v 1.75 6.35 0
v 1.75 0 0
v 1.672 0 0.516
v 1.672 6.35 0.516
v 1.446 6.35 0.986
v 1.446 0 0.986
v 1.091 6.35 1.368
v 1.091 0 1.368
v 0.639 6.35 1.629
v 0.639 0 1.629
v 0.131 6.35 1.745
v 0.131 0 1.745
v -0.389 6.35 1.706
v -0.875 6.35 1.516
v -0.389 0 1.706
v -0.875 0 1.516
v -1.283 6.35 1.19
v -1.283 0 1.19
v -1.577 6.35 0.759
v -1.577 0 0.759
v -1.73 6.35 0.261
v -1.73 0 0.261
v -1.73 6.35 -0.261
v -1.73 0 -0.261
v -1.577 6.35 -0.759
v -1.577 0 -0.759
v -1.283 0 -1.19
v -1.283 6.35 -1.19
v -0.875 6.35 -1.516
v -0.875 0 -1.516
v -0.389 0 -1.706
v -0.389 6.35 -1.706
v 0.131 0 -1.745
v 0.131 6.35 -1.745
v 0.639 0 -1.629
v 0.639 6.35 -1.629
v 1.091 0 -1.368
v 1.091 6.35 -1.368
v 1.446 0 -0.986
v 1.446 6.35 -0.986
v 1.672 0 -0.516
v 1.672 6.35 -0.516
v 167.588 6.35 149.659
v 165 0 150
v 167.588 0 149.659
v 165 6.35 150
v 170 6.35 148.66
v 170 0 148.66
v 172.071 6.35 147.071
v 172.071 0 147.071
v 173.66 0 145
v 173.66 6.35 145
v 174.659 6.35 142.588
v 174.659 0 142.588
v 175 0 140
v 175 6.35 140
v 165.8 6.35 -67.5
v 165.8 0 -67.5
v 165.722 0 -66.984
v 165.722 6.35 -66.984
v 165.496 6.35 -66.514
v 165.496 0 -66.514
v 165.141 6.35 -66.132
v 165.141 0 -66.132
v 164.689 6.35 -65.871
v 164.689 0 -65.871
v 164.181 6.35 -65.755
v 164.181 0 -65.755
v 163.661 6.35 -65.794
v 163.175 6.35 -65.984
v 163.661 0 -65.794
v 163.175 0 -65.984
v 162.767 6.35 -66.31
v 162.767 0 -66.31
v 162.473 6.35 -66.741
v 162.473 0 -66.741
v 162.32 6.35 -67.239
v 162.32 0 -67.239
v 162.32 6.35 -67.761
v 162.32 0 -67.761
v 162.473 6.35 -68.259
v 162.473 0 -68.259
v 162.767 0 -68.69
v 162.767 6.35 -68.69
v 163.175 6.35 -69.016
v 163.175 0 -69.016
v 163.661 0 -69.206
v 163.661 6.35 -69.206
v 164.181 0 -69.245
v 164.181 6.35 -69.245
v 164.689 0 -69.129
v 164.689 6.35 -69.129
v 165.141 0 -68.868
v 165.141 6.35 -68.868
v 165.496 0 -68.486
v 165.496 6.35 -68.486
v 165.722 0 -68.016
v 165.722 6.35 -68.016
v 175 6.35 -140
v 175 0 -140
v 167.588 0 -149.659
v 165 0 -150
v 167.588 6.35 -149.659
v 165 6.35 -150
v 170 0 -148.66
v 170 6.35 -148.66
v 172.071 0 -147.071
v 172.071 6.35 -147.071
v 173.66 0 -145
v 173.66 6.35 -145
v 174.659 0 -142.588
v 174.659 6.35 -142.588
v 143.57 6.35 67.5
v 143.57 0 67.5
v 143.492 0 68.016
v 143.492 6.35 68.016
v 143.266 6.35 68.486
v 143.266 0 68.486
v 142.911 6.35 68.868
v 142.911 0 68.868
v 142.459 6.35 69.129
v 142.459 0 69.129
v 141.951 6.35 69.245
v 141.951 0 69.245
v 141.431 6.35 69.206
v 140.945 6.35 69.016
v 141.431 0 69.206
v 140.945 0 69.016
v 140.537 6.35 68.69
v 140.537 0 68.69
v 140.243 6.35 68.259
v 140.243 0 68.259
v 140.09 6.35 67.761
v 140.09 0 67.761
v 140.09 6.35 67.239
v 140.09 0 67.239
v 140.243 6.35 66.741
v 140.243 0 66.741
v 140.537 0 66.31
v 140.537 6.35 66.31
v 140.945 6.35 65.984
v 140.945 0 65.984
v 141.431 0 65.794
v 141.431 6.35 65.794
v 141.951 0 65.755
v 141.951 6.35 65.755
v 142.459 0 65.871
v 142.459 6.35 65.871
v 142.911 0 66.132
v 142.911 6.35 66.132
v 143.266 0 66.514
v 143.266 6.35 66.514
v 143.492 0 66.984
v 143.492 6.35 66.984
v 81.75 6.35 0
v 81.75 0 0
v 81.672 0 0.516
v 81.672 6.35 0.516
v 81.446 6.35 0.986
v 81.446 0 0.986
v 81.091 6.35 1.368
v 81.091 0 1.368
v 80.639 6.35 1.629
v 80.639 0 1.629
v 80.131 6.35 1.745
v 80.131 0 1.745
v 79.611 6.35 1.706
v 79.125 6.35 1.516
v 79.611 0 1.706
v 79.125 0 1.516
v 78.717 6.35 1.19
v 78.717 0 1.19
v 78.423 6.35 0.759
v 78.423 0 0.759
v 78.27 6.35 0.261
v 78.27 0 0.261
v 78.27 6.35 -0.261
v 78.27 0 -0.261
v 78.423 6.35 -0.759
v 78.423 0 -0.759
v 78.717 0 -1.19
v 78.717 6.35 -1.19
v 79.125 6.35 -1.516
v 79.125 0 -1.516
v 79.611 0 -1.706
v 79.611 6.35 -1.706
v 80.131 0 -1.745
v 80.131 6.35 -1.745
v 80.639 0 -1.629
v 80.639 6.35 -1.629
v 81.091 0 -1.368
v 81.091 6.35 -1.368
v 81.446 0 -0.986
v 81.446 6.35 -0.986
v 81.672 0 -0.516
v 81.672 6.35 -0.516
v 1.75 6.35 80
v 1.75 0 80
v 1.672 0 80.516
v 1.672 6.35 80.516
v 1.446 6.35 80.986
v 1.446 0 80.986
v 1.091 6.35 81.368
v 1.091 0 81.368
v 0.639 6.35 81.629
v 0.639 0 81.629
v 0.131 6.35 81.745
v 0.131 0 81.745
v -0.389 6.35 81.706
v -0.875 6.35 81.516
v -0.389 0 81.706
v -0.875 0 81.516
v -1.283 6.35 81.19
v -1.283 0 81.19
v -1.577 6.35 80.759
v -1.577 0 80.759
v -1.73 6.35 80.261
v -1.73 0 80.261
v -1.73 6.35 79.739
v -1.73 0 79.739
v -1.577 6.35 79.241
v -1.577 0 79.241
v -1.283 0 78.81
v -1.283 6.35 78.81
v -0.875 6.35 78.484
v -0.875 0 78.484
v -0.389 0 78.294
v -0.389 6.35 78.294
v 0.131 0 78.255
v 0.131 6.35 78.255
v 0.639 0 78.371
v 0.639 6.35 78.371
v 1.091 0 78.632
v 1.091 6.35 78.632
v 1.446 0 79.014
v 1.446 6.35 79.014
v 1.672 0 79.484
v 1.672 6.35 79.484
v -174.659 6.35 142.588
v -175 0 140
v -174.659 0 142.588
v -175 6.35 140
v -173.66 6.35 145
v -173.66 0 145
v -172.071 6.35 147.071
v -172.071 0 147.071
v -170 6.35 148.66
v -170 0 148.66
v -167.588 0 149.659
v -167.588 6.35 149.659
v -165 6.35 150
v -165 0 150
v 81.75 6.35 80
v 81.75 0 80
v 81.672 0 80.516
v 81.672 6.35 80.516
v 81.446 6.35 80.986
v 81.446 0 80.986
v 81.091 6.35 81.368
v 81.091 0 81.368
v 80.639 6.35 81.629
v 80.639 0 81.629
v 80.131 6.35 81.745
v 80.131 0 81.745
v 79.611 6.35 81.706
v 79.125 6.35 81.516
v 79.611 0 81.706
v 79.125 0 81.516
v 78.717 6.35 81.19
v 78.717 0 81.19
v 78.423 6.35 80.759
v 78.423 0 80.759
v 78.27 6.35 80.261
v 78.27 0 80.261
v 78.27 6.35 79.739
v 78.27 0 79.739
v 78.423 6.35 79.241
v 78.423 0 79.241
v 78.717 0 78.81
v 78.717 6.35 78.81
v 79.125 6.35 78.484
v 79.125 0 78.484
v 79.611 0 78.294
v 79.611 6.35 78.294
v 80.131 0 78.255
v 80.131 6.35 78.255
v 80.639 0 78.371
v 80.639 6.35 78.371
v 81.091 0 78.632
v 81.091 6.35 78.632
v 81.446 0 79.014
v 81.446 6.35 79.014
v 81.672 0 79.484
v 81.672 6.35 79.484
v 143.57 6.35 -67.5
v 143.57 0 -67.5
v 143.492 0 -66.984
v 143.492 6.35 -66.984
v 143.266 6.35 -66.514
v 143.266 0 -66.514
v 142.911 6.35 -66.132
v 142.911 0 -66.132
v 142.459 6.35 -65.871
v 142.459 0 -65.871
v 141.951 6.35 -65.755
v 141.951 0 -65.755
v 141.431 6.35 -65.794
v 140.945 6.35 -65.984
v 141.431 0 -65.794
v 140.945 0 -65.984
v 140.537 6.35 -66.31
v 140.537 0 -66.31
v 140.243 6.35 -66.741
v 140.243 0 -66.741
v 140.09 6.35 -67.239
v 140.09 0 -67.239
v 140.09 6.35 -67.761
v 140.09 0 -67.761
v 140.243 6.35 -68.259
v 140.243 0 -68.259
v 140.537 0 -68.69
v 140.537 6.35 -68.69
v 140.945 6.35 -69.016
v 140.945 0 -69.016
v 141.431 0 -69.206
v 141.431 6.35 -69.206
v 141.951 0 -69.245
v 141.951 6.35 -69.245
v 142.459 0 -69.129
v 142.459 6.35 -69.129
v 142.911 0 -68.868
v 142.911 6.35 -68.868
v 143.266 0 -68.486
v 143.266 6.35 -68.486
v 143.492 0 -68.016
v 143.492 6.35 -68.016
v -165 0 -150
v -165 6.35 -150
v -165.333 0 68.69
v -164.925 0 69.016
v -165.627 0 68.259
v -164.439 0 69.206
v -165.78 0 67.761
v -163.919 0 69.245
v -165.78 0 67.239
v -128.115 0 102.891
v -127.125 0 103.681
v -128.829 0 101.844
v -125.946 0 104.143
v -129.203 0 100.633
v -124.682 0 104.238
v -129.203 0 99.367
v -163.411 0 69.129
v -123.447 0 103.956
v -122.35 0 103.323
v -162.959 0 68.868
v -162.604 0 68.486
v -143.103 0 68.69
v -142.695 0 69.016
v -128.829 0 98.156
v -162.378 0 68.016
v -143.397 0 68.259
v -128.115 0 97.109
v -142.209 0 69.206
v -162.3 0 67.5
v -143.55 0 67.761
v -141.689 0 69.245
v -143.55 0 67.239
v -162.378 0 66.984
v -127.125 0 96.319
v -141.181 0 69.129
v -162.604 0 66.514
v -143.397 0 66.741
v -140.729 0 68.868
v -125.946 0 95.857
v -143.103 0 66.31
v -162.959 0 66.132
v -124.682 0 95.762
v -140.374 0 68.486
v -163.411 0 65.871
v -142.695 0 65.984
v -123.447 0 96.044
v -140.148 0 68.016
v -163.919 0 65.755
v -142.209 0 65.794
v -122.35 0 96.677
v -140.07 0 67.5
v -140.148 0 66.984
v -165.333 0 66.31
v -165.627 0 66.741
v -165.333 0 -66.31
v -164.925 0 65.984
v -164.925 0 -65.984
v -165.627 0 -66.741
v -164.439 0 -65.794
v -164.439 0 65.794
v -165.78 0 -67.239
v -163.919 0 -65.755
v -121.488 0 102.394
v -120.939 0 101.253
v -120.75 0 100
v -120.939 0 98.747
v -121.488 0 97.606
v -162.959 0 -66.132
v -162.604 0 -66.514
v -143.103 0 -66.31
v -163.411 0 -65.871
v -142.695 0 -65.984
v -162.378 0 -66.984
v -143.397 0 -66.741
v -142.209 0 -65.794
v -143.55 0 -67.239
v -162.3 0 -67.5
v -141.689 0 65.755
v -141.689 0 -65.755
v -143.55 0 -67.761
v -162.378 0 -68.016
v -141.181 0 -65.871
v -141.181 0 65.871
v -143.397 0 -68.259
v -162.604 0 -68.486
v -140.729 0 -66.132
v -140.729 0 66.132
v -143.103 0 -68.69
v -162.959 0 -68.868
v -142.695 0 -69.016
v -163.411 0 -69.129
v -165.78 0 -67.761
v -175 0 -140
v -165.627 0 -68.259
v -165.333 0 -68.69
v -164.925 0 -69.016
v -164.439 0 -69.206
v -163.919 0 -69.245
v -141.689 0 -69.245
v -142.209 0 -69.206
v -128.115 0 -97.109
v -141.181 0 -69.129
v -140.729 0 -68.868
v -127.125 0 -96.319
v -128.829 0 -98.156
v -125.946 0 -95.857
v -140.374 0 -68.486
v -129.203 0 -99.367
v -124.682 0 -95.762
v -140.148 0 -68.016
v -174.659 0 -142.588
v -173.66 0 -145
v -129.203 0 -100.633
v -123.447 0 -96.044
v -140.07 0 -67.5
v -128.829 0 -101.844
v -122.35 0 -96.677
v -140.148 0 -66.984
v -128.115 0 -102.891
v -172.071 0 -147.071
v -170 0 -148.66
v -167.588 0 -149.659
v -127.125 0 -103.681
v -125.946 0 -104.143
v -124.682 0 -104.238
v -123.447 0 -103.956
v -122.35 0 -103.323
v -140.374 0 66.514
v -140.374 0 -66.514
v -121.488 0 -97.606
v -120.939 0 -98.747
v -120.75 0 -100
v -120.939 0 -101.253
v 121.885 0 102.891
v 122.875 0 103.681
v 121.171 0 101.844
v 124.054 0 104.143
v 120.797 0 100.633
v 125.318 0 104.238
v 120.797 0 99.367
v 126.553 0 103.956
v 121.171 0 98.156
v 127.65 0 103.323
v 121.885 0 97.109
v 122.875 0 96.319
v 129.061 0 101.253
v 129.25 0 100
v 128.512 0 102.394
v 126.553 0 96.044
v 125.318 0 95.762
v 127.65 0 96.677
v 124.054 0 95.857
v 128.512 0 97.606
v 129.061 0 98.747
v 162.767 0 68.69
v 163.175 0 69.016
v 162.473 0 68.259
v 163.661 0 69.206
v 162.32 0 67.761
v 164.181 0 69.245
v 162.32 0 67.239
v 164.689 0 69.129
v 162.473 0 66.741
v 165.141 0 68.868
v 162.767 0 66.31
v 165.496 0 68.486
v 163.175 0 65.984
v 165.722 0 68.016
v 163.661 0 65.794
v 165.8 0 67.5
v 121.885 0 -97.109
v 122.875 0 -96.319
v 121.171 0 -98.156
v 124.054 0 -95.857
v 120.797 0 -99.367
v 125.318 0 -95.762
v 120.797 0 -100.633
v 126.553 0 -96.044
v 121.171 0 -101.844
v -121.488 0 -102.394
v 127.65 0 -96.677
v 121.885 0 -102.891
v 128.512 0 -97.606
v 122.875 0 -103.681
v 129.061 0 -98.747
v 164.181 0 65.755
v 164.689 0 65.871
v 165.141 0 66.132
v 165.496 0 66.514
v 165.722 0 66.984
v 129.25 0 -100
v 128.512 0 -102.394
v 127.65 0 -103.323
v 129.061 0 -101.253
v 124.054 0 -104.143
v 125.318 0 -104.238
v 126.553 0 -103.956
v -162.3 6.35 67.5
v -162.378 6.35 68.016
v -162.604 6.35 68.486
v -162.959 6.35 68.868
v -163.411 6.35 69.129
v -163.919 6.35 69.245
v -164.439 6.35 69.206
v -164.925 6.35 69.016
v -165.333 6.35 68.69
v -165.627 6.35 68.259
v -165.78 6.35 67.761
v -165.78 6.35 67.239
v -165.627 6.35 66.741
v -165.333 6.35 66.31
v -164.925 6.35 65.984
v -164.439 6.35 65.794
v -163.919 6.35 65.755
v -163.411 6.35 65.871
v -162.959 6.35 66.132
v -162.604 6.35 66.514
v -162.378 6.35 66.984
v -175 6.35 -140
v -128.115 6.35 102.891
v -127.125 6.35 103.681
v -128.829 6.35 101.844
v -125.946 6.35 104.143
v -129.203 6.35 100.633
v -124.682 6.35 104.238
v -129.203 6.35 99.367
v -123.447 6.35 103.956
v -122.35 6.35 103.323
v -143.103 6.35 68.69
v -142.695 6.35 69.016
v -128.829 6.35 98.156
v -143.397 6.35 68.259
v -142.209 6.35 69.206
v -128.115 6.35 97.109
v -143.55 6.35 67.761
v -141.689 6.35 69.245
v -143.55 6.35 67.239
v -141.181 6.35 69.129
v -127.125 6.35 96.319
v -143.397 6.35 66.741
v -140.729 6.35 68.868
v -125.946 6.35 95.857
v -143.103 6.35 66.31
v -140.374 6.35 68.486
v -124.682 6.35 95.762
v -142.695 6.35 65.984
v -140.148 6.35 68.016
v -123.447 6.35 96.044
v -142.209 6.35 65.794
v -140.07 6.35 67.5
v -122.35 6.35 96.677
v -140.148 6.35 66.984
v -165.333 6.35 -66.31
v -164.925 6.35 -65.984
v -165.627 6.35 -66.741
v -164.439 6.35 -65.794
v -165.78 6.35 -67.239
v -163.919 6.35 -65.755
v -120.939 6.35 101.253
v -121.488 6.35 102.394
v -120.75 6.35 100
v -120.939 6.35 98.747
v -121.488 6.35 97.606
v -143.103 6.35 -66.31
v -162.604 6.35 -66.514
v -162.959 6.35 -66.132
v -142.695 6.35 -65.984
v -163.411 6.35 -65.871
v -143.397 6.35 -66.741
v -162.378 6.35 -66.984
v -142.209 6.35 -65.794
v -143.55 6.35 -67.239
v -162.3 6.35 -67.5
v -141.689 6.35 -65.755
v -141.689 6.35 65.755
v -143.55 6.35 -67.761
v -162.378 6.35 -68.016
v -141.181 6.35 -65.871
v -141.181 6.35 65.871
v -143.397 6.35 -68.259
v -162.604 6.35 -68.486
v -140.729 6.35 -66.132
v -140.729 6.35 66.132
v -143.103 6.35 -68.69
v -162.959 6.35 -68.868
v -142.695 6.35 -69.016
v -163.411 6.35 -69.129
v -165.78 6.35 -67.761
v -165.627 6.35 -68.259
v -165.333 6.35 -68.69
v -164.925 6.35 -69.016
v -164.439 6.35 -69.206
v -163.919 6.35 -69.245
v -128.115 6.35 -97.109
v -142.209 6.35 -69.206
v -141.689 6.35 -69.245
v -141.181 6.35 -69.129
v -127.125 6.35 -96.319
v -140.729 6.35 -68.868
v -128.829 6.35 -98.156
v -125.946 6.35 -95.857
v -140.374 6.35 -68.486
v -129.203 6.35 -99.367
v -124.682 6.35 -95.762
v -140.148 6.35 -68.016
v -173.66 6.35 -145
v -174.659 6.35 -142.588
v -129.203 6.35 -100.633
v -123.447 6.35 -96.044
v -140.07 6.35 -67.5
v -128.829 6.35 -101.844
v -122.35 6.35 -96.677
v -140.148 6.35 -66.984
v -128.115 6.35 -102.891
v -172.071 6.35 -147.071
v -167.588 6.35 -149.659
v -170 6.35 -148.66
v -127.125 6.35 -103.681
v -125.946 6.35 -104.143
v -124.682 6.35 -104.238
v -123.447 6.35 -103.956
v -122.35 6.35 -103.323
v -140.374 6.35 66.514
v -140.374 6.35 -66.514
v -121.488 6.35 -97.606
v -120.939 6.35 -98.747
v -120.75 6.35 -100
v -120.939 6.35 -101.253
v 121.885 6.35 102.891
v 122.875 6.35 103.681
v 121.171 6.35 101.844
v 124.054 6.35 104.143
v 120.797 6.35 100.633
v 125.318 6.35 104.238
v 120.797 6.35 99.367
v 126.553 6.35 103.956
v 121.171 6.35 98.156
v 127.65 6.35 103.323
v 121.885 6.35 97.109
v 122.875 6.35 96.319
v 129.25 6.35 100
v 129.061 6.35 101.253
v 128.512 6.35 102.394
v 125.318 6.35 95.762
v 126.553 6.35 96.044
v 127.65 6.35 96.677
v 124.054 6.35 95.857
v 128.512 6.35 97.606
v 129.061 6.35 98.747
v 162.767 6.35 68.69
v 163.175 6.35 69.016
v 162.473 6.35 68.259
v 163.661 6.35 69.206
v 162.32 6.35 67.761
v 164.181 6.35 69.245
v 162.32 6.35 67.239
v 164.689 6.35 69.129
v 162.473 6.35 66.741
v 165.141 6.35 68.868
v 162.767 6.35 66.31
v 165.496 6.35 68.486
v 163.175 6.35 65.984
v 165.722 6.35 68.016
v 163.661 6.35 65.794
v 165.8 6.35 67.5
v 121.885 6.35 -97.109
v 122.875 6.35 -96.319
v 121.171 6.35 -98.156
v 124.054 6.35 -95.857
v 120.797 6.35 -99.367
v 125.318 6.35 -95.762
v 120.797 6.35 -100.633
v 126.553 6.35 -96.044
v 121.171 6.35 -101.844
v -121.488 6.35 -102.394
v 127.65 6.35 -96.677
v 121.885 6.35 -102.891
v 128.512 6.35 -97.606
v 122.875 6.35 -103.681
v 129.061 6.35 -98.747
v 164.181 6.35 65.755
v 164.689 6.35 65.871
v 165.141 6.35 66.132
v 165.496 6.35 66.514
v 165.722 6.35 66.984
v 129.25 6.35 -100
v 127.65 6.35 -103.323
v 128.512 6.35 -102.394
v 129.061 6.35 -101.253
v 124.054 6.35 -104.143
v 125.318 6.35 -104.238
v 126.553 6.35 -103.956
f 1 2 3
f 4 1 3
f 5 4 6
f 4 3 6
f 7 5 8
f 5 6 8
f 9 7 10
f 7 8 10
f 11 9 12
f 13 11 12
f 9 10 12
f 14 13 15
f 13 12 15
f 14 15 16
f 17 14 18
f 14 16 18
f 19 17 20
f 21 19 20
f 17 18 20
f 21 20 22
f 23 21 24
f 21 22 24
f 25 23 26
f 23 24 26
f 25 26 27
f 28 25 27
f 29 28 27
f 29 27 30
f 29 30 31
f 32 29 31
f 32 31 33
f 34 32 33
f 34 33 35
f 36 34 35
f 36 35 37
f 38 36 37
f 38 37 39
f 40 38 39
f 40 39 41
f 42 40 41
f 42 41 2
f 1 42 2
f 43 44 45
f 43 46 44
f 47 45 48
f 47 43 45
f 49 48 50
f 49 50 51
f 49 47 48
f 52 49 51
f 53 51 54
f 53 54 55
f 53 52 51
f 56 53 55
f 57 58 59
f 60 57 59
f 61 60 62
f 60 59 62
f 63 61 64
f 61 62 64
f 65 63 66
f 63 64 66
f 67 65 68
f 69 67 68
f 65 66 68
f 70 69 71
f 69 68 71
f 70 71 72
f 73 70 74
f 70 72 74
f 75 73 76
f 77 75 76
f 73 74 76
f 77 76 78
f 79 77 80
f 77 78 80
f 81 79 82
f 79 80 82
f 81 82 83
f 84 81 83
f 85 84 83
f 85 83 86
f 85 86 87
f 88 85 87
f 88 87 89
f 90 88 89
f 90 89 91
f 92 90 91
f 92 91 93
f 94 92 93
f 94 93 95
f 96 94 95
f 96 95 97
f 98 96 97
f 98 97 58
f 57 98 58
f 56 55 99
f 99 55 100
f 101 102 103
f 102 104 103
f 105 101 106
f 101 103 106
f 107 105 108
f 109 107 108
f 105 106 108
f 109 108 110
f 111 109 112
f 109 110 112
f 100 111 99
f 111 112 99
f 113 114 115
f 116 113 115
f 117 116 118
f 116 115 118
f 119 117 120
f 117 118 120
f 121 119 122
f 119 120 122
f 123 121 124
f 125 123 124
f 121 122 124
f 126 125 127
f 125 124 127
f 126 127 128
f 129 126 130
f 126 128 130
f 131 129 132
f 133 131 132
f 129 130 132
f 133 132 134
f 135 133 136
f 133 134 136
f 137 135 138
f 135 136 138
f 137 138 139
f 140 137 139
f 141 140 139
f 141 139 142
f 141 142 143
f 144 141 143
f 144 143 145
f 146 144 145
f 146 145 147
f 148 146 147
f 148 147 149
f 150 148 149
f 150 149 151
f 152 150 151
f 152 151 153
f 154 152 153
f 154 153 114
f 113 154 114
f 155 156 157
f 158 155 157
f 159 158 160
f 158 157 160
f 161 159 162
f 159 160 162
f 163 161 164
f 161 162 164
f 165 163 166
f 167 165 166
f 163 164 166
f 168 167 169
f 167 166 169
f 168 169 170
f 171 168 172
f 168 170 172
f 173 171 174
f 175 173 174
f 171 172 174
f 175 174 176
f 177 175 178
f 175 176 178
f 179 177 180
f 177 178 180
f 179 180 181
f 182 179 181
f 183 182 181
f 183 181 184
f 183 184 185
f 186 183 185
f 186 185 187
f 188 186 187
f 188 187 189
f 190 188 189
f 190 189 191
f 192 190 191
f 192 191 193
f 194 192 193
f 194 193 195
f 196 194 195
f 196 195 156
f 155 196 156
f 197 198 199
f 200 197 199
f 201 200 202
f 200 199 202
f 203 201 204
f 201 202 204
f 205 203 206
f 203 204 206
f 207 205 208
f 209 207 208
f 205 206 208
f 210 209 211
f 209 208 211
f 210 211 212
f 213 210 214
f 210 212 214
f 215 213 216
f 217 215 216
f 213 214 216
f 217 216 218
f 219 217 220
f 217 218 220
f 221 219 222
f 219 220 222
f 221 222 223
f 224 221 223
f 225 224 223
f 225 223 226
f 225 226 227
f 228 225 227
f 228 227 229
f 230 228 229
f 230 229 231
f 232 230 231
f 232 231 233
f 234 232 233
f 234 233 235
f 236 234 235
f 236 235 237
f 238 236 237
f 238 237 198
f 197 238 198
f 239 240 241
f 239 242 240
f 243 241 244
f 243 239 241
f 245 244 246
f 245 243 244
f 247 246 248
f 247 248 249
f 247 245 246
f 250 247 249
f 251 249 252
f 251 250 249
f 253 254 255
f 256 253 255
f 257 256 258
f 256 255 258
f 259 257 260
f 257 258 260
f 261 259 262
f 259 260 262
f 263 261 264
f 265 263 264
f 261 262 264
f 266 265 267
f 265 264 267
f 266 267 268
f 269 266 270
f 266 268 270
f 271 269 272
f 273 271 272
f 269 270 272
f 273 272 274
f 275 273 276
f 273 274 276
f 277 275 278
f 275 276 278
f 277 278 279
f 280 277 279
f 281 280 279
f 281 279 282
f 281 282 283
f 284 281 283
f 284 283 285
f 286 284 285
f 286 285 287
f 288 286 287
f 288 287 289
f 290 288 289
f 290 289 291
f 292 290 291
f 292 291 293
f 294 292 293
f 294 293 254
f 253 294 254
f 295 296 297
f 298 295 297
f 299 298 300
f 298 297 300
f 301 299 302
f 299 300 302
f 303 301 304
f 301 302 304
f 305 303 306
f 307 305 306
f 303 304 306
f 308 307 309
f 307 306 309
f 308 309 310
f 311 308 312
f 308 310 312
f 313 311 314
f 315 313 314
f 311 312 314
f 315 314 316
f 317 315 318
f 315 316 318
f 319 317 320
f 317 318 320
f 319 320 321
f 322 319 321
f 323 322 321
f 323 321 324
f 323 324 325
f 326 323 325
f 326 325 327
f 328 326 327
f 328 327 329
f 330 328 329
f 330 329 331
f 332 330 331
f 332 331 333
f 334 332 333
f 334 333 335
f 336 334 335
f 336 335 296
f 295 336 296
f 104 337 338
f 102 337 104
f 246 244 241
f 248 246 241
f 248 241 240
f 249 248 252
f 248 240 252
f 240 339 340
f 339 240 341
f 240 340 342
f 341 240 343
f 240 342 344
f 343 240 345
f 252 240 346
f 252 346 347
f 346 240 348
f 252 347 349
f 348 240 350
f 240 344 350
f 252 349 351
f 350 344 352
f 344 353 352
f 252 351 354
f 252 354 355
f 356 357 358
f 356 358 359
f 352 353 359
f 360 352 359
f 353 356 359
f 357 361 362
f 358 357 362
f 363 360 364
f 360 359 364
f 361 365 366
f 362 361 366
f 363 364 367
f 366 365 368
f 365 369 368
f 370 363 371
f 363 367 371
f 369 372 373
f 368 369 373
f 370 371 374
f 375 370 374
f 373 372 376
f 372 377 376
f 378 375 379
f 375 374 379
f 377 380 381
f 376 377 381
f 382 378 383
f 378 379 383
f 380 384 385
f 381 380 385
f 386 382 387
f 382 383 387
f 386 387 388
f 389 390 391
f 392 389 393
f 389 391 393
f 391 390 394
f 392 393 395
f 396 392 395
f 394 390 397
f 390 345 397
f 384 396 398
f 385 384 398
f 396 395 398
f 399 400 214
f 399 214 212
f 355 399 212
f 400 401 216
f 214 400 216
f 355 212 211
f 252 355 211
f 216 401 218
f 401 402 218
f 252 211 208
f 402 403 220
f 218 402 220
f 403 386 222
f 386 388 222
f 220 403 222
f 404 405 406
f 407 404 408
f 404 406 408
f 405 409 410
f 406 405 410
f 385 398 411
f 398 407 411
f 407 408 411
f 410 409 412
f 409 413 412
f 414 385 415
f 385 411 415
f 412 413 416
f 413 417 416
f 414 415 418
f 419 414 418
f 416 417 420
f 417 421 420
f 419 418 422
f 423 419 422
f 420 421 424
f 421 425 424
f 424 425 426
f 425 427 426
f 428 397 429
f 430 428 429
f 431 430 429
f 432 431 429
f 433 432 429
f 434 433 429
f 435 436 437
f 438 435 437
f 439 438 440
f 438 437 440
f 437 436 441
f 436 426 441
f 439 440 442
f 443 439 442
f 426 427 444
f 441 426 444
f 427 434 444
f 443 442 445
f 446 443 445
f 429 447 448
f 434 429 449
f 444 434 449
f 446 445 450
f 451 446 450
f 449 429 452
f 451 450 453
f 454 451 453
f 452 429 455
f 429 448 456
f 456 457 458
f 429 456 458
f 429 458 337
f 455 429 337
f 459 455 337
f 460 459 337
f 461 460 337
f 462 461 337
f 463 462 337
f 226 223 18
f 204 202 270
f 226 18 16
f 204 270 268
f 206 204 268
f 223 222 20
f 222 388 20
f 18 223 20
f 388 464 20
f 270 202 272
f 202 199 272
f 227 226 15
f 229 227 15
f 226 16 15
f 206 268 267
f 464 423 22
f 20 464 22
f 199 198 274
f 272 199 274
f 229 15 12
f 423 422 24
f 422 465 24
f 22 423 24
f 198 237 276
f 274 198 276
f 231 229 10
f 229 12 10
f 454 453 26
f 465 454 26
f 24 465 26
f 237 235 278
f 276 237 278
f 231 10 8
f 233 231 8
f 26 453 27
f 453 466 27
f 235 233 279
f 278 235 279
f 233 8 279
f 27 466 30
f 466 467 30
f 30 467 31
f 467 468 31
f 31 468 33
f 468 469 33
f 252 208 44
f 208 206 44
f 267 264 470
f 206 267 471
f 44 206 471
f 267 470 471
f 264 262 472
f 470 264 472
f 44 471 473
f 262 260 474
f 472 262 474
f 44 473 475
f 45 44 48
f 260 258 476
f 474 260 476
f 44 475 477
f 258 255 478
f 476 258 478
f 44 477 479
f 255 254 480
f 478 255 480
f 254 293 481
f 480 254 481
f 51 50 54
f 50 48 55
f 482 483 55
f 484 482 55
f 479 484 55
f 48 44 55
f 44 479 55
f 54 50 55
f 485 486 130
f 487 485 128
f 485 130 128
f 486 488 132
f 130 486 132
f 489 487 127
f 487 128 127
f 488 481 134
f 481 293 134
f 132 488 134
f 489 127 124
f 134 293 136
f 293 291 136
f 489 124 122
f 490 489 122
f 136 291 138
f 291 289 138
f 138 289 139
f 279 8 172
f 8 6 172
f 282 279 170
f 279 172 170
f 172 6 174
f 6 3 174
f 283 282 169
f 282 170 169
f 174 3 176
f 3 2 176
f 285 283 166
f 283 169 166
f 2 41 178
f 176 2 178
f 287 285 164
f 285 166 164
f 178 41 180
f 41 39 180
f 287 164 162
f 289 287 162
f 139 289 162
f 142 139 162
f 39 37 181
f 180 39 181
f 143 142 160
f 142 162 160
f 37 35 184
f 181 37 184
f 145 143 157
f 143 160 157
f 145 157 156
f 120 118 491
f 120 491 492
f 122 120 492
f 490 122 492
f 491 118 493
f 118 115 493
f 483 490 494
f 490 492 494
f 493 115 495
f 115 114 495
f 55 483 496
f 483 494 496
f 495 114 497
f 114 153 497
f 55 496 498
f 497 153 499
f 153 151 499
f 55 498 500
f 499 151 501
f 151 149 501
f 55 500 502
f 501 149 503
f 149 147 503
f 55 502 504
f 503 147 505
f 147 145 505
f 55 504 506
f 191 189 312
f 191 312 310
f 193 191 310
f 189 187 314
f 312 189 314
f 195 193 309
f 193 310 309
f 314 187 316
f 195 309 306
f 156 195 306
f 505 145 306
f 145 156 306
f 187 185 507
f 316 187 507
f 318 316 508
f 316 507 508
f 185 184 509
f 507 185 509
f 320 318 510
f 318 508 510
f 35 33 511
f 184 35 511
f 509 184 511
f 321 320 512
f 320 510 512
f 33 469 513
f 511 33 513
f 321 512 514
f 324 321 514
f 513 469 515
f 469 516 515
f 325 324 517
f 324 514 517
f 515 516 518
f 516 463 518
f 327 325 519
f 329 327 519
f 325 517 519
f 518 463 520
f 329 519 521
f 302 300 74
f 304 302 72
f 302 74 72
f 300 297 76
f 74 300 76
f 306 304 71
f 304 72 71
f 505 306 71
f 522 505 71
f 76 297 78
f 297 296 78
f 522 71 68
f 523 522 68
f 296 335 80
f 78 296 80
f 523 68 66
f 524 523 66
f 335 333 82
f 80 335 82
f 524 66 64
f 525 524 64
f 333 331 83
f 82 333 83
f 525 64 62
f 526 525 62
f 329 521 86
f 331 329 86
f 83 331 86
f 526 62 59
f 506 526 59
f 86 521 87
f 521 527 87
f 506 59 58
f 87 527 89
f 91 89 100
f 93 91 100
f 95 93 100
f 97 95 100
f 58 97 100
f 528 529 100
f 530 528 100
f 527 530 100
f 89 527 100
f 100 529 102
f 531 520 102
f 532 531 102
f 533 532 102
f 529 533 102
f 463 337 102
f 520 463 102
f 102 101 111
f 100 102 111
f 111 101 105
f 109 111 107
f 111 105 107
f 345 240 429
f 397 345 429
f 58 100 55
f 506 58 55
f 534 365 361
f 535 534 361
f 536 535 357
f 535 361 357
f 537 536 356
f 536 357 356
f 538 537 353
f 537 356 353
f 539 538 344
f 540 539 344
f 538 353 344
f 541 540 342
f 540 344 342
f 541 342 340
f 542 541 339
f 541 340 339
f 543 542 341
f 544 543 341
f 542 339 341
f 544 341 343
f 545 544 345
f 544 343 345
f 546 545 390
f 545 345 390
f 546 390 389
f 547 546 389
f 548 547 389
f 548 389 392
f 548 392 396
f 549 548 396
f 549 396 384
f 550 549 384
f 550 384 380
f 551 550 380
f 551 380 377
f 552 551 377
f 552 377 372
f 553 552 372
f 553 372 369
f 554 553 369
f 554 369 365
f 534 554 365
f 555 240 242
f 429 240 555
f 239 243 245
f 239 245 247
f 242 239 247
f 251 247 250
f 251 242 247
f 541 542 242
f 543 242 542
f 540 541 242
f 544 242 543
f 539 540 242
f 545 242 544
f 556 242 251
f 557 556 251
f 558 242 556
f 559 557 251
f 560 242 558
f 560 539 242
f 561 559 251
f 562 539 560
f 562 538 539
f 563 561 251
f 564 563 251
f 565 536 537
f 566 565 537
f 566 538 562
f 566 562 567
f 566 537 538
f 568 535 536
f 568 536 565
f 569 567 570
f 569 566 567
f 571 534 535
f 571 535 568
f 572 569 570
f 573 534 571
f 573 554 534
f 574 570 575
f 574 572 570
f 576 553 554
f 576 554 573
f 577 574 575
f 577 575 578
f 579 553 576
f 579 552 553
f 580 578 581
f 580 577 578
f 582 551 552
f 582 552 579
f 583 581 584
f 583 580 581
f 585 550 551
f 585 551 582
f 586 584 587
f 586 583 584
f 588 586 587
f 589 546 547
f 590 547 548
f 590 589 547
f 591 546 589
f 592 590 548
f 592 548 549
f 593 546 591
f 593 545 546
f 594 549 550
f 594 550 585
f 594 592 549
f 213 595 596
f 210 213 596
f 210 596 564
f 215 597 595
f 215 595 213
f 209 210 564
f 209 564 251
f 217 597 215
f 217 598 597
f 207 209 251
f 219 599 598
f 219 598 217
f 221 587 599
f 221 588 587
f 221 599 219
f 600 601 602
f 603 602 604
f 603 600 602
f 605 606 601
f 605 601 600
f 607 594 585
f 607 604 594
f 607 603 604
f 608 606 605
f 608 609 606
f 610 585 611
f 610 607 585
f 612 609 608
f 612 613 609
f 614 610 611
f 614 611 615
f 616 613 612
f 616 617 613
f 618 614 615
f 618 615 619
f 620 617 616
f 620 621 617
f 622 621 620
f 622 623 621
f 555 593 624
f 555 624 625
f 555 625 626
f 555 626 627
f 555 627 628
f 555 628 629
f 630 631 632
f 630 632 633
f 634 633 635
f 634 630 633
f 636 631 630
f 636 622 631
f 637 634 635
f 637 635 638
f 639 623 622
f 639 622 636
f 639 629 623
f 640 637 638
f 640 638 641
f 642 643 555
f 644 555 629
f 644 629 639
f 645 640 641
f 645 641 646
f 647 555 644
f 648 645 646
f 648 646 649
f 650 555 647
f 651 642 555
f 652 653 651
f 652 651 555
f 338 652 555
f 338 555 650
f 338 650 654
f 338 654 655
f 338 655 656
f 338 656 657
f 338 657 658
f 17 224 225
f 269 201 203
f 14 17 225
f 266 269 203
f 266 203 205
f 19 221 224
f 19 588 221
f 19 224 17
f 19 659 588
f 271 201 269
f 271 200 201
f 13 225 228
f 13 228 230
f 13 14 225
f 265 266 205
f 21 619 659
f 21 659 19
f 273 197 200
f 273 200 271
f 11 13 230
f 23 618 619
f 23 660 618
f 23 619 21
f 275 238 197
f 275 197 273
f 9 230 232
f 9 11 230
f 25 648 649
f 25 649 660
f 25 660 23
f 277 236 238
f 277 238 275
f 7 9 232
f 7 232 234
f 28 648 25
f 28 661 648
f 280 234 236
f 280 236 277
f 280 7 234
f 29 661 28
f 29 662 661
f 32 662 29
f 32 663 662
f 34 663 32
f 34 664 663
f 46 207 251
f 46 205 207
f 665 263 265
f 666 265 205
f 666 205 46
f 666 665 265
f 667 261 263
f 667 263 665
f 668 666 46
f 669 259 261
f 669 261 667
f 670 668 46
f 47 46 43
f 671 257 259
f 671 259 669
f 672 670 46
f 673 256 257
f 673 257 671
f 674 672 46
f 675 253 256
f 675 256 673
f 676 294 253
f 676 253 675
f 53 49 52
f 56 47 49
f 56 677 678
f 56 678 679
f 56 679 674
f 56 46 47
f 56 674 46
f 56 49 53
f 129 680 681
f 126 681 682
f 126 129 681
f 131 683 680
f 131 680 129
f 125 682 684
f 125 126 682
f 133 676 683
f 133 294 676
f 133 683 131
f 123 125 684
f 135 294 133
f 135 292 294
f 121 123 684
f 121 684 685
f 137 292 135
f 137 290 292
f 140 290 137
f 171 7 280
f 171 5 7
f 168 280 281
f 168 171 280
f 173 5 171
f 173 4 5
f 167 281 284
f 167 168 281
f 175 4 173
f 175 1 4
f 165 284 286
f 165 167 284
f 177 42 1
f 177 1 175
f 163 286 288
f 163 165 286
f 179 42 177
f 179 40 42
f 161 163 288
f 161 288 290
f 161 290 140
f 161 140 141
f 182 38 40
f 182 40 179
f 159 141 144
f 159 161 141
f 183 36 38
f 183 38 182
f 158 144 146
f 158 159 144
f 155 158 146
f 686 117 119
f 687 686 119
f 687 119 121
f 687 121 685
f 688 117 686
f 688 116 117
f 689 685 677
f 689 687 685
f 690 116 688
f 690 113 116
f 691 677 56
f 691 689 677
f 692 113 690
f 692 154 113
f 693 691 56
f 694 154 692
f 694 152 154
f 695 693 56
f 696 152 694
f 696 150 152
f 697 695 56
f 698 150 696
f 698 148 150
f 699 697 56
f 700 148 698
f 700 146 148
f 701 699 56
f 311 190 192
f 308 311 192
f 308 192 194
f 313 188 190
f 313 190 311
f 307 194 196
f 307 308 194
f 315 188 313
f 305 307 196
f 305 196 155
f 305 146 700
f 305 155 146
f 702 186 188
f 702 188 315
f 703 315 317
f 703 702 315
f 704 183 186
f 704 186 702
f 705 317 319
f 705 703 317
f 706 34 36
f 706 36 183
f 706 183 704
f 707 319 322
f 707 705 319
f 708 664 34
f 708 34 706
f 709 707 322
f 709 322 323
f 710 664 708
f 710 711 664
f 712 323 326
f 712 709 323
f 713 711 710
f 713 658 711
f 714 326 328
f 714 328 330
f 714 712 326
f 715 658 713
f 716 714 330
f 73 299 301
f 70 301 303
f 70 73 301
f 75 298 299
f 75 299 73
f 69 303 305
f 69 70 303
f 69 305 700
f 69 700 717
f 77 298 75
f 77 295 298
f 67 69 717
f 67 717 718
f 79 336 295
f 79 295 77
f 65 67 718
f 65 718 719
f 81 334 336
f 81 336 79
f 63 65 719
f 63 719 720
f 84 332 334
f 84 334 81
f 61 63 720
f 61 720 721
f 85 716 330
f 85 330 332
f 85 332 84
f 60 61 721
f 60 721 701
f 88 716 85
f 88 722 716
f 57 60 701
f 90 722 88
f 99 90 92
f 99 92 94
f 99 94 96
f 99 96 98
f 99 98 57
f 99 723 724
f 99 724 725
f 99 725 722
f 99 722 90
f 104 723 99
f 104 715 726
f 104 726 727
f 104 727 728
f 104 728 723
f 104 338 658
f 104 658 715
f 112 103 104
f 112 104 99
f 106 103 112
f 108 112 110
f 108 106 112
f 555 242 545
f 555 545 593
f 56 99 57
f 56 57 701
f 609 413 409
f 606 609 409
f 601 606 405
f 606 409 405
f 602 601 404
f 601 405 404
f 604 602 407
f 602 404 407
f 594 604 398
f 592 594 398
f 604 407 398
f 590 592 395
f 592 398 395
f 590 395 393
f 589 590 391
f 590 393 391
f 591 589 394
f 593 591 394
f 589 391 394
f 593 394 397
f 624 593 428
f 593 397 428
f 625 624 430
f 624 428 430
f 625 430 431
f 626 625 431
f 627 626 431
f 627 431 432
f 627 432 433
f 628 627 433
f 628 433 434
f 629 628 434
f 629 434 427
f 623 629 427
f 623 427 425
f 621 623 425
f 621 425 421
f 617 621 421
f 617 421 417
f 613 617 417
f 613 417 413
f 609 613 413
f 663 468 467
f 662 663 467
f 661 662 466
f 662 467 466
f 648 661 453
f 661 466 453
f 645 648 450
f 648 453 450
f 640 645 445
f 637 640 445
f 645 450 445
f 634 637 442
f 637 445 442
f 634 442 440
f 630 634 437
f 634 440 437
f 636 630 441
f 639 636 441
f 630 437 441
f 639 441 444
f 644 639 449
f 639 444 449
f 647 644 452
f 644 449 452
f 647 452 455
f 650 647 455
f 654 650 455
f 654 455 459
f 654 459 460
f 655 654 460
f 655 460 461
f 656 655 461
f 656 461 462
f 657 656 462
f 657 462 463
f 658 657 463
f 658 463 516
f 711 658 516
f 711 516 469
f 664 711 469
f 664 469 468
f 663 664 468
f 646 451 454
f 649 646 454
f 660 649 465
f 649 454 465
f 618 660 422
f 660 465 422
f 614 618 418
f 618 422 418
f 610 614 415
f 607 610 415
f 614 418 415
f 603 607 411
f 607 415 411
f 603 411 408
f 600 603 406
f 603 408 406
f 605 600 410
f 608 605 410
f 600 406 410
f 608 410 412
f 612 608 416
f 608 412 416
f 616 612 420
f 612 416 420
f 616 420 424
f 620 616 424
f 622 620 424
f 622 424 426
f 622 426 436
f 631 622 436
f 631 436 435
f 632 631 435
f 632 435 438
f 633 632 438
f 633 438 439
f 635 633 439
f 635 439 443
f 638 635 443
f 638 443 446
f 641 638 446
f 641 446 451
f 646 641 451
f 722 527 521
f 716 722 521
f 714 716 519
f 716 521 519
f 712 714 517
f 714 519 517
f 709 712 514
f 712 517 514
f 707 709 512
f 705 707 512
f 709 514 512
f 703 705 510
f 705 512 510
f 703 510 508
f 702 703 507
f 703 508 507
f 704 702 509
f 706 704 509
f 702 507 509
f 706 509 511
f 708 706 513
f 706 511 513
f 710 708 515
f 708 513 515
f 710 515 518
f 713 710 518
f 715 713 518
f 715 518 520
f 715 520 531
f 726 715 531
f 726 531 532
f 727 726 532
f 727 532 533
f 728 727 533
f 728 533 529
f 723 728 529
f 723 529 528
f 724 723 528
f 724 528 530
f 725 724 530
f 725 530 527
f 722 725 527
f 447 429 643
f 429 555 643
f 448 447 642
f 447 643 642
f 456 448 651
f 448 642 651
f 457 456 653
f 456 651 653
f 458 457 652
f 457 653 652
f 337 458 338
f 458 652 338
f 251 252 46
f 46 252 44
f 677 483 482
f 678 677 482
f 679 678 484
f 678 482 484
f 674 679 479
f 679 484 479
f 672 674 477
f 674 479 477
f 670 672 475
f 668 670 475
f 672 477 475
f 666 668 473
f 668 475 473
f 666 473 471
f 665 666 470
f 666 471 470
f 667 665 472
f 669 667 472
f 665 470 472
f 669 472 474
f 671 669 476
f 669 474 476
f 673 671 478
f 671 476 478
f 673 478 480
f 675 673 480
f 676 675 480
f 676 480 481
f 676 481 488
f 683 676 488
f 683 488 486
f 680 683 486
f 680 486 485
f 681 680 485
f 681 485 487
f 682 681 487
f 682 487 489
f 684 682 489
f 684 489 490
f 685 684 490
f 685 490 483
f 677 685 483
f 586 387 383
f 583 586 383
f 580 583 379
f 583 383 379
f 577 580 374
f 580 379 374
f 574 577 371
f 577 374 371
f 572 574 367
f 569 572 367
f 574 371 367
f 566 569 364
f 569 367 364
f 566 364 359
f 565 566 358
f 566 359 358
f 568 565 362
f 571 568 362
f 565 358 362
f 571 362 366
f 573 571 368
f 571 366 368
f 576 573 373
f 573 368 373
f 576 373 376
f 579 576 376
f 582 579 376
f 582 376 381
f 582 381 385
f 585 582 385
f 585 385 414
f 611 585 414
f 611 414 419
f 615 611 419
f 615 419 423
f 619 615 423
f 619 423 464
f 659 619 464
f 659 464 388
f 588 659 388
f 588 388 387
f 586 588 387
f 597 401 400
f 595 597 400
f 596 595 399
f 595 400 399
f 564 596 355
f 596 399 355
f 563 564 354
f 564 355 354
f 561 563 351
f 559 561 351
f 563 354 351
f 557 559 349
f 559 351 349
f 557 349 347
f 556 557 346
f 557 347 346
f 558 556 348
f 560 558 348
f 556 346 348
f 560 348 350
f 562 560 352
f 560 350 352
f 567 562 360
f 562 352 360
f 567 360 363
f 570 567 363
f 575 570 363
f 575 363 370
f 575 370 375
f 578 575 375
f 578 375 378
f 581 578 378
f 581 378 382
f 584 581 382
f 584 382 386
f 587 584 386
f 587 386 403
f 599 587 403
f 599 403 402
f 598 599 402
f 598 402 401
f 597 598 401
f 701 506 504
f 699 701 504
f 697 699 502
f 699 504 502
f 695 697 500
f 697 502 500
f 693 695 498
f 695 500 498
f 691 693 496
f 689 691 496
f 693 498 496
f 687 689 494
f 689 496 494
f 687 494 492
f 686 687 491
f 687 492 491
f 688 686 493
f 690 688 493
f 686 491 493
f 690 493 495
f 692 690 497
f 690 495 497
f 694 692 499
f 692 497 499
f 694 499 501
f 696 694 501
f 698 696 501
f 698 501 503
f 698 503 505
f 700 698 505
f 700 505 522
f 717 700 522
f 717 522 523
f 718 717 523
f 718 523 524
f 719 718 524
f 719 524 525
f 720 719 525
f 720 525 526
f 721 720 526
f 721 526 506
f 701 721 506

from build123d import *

# Parameters (mm, degrees)
SKETCH1_W                 = 350
SKETCH1_H                 = 300
BOSS_EXTRUDE1_DEPTH       = 6.35
SKETCH2_R                 = 4.25
CUT_EXTRUDE1_DEPTH        = 7.35
LPATTERN2_COUNT           = 2
LPATTERN2_PITCH           = 200
LPATTERN3_COUNT           = 2
LPATTERN3_PITCH           = 250
LPATTERN3_COPY_1_SKETCH_R = 4.25
LPATTERN3_COPY_1_DEPTH    = 7.35
FILLET1_R                 = 10
SKETCH4_R                 = 1.75
CUT_EXTRUDE2_DEPTH        = 7.35
LPATTERN5_COUNT           = 2
LPATTERN5_PITCH           = 80
LPATTERN5_COUNT_DIR2      = 2
LPATTERN5_PITCH_DIR2      = 80
SKETCH5_R                 = 1.75
CUT_EXTRUDE3_DEPTH        = 7.35
LPATTERN6_COUNT           = 2
LPATTERN6_PITCH           = 22.23
LPATTERN6_COUNT_DIR2      = 2
LPATTERN6_PITCH_DIR2      = 135
SKETCH7_R                 = 1.75
CUT_EXTRUDE4_DEPTH        = 7.35
LPATTERN9_COUNT           = 2
LPATTERN9_PITCH           = 22.23
LPATTERN9_COUNT_DIR2      = 2
LPATTERN9_PITCH_DIR2      = 135


with BuildPart() as part:
    # Sketch1 → Boss-Extrude1 (new body)
    with BuildSketch(Plane(origin=(0, 0, 0), x_dir=(1, 0, 0), z_dir=(0, 1, 0))):
        Rectangle(SKETCH1_W, SKETCH1_H)
    extrude(amount=BOSS_EXTRUDE1_DEPTH)

    # Sketch2 → Cut-Extrude1 (cut, through all)
    with BuildSketch(Plane.XZ):
        with Locations((-125, -100)):
            Circle(SKETCH2_R)
    cut_extrude1 = extrude(amount=-CUT_EXTRUDE1_DEPTH, mode=Mode.SUBTRACT)

    # LPattern2: Cut-Extrude1 ×2
    with Locations(*[(0, 0, i * LPATTERN2_PITCH) for i in range(1, LPATTERN2_COUNT)]):
        add(cut_extrude1, mode=Mode.SUBTRACT)

    # LPattern3: Cut-Extrude1 ×2
    with Locations(*[(i * LPATTERN3_PITCH, 0, 0) for i in range(1, LPATTERN3_COUNT)]):
        add(cut_extrude1, mode=Mode.SUBTRACT)

    # LPattern3 copy 1 sketch → LPattern3 copy 1 (cut, through all)
    with BuildSketch(Plane(origin=(250, 0, 200), x_dir=(1, 0, 0), z_dir=(0, -1, 0))):
        with Locations((-125, -100)):
            Circle(LPATTERN3_COPY_1_SKETCH_R)
    extrude(amount=-LPATTERN3_COPY_1_DEPTH, mode=Mode.SUBTRACT)

    # Fillet1
    fillet1_edges = [part.edges().sort_by_distance(p)[0] for p in [
        (-175, 3.175, -150),
        (175, 3.175, -150),
        (175, 3.175, 150),
        (-175, 3.175, 150),
    ]]
    fillet(fillet1_edges, radius=FILLET1_R)

    # Sketch4 → Cut-Extrude2 (cut, through all)
    with BuildSketch(Plane.XZ):
        Circle(SKETCH4_R)
    cut_extrude2 = extrude(amount=-CUT_EXTRUDE2_DEPTH, mode=Mode.SUBTRACT)

    # LPattern5: Cut-Extrude2 2 × 2
    with Locations(*[(i * LPATTERN5_PITCH, 0, j * LPATTERN5_PITCH_DIR2) for i in range(LPATTERN5_COUNT) for j in range(LPATTERN5_COUNT_DIR2) if (i, j) != (0, 0)]):
        add(cut_extrude2, mode=Mode.SUBTRACT)

    # Sketch5 → Cut-Extrude3 (cut, through all)
    with BuildSketch(Plane.XZ):
        with Locations((-141.82, -67.5)):
            Circle(SKETCH5_R)
    cut_extrude3 = extrude(amount=-CUT_EXTRUDE3_DEPTH, mode=Mode.SUBTRACT)

    # LPattern6: Cut-Extrude3 2 × 2
    with Locations(*[(-i * LPATTERN6_PITCH, 0, j * LPATTERN6_PITCH_DIR2) for i in range(LPATTERN6_COUNT) for j in range(LPATTERN6_COUNT_DIR2) if (i, j) != (0, 0)]):
        add(cut_extrude3, mode=Mode.SUBTRACT)

    # Sketch7 → Cut-Extrude4 (cut, through all)
    with BuildSketch(Plane.XZ):
        with Locations((141.82, -67.5)):
            Circle(SKETCH7_R)
    cut_extrude4 = extrude(amount=-CUT_EXTRUDE4_DEPTH, mode=Mode.SUBTRACT)

    # LPattern9: Cut-Extrude4 2 × 2
    with Locations(*[(i * LPATTERN9_PITCH, 0, j * LPATTERN9_PITCH_DIR2) for i in range(LPATTERN9_COUNT) for j in range(LPATTERN9_COUNT_DIR2) if (i, j) != (0, 0)]):
        add(cut_extrude4, mode=Mode.SUBTRACT)


solid = part.part
